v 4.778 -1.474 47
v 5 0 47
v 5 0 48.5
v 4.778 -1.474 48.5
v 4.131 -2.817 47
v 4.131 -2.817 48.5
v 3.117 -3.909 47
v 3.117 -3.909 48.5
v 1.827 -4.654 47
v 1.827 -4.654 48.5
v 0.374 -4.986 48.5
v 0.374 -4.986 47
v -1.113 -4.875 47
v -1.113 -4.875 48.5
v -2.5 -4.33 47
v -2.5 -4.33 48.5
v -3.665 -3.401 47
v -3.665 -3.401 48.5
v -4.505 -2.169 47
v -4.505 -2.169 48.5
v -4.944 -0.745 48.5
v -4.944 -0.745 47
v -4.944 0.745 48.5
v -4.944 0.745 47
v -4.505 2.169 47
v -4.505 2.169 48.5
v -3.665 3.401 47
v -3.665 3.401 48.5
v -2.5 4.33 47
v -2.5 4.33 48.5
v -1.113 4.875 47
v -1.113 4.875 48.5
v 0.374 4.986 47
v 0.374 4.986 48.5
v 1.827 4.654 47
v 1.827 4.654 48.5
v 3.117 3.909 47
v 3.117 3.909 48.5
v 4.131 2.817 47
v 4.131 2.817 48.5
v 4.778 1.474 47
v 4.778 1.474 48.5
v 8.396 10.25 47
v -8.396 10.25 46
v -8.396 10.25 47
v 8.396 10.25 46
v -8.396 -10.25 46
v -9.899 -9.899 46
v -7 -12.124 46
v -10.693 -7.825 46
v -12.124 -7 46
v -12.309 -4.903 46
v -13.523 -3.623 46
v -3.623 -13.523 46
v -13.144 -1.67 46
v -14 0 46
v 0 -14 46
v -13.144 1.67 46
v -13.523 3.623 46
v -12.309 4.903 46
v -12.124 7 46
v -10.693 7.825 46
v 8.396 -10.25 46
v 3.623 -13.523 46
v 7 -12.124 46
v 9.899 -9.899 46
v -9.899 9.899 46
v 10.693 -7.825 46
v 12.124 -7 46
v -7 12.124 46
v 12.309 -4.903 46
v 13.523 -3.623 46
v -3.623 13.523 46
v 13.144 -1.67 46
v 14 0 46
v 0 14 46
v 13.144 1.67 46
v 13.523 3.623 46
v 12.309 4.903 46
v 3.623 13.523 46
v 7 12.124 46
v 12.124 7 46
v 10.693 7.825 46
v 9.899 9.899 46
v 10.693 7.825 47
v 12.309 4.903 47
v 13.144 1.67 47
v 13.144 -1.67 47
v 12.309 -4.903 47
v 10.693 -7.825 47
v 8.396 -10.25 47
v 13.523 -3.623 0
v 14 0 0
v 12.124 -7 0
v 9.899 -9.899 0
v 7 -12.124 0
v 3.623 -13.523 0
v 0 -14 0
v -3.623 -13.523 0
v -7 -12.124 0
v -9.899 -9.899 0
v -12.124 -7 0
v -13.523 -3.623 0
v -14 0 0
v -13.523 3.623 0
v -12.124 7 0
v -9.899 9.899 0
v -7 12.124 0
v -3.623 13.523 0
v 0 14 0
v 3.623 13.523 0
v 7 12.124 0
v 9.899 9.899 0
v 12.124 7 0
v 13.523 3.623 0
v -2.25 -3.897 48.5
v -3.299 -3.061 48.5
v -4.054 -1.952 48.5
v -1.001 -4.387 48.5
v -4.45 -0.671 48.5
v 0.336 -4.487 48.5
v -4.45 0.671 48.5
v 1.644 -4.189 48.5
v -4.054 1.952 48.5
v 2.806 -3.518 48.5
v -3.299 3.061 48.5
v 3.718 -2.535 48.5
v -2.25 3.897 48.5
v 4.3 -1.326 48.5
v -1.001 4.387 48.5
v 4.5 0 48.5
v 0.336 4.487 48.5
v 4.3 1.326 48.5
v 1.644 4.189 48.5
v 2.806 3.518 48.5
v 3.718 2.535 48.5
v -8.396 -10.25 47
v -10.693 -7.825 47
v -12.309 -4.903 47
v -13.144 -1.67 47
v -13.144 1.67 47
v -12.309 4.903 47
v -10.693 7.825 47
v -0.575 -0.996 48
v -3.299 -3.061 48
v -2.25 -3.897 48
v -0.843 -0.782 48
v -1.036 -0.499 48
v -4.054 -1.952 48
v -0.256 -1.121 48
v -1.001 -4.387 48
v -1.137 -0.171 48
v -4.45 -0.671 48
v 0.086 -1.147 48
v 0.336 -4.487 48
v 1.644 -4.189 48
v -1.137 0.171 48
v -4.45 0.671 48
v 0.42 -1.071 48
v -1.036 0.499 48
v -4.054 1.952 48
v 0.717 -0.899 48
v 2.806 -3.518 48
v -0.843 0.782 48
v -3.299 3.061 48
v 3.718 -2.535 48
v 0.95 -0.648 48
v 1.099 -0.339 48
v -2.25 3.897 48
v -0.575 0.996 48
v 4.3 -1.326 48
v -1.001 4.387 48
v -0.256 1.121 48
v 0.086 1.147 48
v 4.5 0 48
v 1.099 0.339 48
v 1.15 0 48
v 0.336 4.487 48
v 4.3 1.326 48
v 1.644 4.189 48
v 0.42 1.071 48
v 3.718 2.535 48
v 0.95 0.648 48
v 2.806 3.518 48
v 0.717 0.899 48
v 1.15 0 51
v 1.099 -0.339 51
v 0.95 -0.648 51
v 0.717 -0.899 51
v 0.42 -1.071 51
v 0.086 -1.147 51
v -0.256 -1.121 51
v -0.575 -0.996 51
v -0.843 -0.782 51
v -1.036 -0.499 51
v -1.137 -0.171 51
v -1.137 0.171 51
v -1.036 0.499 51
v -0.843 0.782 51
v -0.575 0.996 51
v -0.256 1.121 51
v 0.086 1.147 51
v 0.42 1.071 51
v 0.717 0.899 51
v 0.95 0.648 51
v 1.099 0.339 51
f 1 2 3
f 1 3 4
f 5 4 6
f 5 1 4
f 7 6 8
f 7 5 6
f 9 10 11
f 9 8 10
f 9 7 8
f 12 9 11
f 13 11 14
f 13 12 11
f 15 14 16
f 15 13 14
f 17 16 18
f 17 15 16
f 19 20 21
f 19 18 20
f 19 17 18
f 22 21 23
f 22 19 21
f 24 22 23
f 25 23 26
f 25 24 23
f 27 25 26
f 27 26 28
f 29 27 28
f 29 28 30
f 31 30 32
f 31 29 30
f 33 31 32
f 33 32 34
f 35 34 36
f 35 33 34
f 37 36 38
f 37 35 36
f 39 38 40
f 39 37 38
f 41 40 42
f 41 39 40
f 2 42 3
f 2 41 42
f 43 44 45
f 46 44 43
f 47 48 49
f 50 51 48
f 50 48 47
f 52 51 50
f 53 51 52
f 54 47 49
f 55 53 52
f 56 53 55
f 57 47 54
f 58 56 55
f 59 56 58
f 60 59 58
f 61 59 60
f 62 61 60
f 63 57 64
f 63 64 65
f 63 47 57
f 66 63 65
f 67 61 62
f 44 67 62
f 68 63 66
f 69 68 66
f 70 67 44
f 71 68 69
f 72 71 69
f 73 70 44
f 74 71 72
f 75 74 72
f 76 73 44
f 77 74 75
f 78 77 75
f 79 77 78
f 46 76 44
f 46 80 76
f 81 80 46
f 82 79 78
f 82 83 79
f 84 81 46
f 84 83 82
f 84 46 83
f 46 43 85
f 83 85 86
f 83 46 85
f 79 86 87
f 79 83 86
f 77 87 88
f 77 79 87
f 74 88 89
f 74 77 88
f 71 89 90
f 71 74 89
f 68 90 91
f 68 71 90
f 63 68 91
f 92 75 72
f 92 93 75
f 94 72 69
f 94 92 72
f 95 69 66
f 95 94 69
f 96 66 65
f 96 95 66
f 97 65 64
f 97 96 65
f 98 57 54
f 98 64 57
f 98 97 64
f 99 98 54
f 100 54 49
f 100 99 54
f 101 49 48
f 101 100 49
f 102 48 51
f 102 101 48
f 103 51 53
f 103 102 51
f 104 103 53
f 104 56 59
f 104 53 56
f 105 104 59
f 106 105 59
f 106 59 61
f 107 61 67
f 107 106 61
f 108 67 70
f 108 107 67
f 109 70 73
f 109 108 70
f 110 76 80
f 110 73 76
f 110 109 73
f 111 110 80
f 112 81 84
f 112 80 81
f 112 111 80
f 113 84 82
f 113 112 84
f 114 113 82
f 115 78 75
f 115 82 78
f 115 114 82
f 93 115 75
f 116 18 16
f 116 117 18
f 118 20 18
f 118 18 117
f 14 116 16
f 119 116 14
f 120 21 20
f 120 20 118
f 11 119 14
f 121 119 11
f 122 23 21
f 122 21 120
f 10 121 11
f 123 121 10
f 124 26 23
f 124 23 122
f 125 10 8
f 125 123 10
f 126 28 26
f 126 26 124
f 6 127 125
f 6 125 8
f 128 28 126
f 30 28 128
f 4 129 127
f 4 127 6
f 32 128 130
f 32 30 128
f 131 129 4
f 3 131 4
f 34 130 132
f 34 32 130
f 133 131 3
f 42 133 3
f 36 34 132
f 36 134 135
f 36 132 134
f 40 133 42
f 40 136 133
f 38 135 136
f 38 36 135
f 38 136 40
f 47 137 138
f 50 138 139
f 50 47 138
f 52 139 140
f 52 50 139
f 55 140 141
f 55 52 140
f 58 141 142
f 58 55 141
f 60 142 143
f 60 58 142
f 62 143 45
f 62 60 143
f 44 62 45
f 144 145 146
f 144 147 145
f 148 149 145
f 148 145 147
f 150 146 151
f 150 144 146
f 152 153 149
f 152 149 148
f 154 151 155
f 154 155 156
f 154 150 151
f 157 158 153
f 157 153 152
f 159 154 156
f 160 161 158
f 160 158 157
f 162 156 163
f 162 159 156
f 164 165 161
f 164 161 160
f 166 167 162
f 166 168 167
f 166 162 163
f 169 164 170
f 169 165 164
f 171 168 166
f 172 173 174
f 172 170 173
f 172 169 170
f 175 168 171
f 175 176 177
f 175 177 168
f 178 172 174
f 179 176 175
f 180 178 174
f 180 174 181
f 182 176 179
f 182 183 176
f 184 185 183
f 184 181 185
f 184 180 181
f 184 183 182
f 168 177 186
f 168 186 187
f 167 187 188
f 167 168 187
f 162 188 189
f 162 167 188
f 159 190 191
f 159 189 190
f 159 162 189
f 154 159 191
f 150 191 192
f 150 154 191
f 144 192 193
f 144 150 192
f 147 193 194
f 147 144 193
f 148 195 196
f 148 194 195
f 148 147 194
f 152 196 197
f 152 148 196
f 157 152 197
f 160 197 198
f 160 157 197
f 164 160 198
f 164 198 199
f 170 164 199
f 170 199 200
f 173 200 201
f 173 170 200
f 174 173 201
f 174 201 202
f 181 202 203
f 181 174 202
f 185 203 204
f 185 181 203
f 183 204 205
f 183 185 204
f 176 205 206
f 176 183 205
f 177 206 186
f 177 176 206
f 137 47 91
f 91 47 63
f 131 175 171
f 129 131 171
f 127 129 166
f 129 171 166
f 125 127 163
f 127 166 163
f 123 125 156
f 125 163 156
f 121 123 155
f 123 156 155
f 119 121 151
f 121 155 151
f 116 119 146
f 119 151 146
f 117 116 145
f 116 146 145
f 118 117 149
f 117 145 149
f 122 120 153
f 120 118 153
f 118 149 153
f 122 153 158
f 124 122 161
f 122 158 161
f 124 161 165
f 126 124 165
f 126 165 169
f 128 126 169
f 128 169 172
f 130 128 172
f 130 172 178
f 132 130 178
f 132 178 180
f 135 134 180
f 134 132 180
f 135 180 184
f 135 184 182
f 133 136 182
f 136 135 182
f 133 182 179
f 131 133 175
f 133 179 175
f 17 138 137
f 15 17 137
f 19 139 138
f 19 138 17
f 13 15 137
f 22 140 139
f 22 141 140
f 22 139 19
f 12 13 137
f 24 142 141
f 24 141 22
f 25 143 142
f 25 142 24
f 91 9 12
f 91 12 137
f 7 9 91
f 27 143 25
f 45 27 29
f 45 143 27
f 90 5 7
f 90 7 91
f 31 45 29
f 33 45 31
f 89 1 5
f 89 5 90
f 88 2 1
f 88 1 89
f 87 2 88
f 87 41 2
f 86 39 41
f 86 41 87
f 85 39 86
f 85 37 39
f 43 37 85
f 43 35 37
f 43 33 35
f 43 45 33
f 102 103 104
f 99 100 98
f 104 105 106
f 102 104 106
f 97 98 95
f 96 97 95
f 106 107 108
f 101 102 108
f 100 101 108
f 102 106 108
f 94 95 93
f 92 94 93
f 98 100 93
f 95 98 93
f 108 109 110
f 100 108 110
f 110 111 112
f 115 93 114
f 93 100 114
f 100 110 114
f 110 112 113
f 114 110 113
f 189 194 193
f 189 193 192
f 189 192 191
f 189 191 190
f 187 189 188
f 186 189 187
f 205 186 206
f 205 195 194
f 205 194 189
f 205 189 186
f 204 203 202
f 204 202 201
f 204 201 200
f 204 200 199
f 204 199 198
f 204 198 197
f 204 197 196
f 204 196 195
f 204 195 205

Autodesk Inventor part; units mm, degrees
ref_plane "YZ Plane" through (0, 0, 0) normal (1, 0, 0) x (0, 1, 0)
ref_plane "XZ Plane" through (0, 0, 0) normal (0, 1, 0) x (-1, 0, 0)
ref_plane "XY Plane" through (0, 0, 0) normal (0, 0, 1) x (1, 0, 0)
sketch "Sketch1" plane through (0, 0, 0) normal (0, 0, 1) x (1, 0, 0)
  circle A0 centre (0, 0) radius 14
  dimension "d0" = 28
extrude "Extrusion1" add sketch "Sketch1" along normal blind 46
sketch "Sketch2" plane through (0, 0, 46) normal (0, 0, 1) x (1, 0, 0)
  line L0 (-8.3964, 10.25) -> (8.3964, 10.25)
  line L1 (-8.3964, -10.25) -> (8.3964, -10.25)
  line L2 (-19.6, 0) -> (19.6, 0) projected
  arc A0 (8.3964, -10.25) -> (8.3964, 10.25) centre (0, 0) ccw
  arc A1 (-8.3964, 10.25) -> (-8.3964, -10.25) centre (0, 0) ccw
  dimension "d4" = 10.25
  dimension "d5" = 10.25
extrude "Extrusion2" add sketch "Sketch2" along normal blind 1
sketch "Sketch3" plane through (0, 0, 47) normal (0, 0, 1) x (1, 0, 0)
  circle A0 centre (0, 0) radius 5
  circle A1 centre (0, 0) radius 4.5
  dimension "d8" = 10
  dimension "d9" = 9
extrude "Extrusion3" add sketch "Sketch3" along normal blind 1.5
sketch "Sketch4" plane through (0, 0, 47) normal (0, 0, 1) x (1, 0, 0)
  circle A0 centre (0, 0) radius 4.5
  dimension "d12" = 9
extrude "Extrusion4" add sketch "Sketch4" along normal blind 1
sketch "Sketch5" plane through (0, 0, 48) normal (0, 0, 1) x (1, 0, 0)
  circle A0 centre (0, 0) radius 1.15
  dimension "d15" = 2.3
extrude "Extrusion5" add sketch "Sketch5" along normal blind 3
properties part number "E600T_RC390_motor_front"
